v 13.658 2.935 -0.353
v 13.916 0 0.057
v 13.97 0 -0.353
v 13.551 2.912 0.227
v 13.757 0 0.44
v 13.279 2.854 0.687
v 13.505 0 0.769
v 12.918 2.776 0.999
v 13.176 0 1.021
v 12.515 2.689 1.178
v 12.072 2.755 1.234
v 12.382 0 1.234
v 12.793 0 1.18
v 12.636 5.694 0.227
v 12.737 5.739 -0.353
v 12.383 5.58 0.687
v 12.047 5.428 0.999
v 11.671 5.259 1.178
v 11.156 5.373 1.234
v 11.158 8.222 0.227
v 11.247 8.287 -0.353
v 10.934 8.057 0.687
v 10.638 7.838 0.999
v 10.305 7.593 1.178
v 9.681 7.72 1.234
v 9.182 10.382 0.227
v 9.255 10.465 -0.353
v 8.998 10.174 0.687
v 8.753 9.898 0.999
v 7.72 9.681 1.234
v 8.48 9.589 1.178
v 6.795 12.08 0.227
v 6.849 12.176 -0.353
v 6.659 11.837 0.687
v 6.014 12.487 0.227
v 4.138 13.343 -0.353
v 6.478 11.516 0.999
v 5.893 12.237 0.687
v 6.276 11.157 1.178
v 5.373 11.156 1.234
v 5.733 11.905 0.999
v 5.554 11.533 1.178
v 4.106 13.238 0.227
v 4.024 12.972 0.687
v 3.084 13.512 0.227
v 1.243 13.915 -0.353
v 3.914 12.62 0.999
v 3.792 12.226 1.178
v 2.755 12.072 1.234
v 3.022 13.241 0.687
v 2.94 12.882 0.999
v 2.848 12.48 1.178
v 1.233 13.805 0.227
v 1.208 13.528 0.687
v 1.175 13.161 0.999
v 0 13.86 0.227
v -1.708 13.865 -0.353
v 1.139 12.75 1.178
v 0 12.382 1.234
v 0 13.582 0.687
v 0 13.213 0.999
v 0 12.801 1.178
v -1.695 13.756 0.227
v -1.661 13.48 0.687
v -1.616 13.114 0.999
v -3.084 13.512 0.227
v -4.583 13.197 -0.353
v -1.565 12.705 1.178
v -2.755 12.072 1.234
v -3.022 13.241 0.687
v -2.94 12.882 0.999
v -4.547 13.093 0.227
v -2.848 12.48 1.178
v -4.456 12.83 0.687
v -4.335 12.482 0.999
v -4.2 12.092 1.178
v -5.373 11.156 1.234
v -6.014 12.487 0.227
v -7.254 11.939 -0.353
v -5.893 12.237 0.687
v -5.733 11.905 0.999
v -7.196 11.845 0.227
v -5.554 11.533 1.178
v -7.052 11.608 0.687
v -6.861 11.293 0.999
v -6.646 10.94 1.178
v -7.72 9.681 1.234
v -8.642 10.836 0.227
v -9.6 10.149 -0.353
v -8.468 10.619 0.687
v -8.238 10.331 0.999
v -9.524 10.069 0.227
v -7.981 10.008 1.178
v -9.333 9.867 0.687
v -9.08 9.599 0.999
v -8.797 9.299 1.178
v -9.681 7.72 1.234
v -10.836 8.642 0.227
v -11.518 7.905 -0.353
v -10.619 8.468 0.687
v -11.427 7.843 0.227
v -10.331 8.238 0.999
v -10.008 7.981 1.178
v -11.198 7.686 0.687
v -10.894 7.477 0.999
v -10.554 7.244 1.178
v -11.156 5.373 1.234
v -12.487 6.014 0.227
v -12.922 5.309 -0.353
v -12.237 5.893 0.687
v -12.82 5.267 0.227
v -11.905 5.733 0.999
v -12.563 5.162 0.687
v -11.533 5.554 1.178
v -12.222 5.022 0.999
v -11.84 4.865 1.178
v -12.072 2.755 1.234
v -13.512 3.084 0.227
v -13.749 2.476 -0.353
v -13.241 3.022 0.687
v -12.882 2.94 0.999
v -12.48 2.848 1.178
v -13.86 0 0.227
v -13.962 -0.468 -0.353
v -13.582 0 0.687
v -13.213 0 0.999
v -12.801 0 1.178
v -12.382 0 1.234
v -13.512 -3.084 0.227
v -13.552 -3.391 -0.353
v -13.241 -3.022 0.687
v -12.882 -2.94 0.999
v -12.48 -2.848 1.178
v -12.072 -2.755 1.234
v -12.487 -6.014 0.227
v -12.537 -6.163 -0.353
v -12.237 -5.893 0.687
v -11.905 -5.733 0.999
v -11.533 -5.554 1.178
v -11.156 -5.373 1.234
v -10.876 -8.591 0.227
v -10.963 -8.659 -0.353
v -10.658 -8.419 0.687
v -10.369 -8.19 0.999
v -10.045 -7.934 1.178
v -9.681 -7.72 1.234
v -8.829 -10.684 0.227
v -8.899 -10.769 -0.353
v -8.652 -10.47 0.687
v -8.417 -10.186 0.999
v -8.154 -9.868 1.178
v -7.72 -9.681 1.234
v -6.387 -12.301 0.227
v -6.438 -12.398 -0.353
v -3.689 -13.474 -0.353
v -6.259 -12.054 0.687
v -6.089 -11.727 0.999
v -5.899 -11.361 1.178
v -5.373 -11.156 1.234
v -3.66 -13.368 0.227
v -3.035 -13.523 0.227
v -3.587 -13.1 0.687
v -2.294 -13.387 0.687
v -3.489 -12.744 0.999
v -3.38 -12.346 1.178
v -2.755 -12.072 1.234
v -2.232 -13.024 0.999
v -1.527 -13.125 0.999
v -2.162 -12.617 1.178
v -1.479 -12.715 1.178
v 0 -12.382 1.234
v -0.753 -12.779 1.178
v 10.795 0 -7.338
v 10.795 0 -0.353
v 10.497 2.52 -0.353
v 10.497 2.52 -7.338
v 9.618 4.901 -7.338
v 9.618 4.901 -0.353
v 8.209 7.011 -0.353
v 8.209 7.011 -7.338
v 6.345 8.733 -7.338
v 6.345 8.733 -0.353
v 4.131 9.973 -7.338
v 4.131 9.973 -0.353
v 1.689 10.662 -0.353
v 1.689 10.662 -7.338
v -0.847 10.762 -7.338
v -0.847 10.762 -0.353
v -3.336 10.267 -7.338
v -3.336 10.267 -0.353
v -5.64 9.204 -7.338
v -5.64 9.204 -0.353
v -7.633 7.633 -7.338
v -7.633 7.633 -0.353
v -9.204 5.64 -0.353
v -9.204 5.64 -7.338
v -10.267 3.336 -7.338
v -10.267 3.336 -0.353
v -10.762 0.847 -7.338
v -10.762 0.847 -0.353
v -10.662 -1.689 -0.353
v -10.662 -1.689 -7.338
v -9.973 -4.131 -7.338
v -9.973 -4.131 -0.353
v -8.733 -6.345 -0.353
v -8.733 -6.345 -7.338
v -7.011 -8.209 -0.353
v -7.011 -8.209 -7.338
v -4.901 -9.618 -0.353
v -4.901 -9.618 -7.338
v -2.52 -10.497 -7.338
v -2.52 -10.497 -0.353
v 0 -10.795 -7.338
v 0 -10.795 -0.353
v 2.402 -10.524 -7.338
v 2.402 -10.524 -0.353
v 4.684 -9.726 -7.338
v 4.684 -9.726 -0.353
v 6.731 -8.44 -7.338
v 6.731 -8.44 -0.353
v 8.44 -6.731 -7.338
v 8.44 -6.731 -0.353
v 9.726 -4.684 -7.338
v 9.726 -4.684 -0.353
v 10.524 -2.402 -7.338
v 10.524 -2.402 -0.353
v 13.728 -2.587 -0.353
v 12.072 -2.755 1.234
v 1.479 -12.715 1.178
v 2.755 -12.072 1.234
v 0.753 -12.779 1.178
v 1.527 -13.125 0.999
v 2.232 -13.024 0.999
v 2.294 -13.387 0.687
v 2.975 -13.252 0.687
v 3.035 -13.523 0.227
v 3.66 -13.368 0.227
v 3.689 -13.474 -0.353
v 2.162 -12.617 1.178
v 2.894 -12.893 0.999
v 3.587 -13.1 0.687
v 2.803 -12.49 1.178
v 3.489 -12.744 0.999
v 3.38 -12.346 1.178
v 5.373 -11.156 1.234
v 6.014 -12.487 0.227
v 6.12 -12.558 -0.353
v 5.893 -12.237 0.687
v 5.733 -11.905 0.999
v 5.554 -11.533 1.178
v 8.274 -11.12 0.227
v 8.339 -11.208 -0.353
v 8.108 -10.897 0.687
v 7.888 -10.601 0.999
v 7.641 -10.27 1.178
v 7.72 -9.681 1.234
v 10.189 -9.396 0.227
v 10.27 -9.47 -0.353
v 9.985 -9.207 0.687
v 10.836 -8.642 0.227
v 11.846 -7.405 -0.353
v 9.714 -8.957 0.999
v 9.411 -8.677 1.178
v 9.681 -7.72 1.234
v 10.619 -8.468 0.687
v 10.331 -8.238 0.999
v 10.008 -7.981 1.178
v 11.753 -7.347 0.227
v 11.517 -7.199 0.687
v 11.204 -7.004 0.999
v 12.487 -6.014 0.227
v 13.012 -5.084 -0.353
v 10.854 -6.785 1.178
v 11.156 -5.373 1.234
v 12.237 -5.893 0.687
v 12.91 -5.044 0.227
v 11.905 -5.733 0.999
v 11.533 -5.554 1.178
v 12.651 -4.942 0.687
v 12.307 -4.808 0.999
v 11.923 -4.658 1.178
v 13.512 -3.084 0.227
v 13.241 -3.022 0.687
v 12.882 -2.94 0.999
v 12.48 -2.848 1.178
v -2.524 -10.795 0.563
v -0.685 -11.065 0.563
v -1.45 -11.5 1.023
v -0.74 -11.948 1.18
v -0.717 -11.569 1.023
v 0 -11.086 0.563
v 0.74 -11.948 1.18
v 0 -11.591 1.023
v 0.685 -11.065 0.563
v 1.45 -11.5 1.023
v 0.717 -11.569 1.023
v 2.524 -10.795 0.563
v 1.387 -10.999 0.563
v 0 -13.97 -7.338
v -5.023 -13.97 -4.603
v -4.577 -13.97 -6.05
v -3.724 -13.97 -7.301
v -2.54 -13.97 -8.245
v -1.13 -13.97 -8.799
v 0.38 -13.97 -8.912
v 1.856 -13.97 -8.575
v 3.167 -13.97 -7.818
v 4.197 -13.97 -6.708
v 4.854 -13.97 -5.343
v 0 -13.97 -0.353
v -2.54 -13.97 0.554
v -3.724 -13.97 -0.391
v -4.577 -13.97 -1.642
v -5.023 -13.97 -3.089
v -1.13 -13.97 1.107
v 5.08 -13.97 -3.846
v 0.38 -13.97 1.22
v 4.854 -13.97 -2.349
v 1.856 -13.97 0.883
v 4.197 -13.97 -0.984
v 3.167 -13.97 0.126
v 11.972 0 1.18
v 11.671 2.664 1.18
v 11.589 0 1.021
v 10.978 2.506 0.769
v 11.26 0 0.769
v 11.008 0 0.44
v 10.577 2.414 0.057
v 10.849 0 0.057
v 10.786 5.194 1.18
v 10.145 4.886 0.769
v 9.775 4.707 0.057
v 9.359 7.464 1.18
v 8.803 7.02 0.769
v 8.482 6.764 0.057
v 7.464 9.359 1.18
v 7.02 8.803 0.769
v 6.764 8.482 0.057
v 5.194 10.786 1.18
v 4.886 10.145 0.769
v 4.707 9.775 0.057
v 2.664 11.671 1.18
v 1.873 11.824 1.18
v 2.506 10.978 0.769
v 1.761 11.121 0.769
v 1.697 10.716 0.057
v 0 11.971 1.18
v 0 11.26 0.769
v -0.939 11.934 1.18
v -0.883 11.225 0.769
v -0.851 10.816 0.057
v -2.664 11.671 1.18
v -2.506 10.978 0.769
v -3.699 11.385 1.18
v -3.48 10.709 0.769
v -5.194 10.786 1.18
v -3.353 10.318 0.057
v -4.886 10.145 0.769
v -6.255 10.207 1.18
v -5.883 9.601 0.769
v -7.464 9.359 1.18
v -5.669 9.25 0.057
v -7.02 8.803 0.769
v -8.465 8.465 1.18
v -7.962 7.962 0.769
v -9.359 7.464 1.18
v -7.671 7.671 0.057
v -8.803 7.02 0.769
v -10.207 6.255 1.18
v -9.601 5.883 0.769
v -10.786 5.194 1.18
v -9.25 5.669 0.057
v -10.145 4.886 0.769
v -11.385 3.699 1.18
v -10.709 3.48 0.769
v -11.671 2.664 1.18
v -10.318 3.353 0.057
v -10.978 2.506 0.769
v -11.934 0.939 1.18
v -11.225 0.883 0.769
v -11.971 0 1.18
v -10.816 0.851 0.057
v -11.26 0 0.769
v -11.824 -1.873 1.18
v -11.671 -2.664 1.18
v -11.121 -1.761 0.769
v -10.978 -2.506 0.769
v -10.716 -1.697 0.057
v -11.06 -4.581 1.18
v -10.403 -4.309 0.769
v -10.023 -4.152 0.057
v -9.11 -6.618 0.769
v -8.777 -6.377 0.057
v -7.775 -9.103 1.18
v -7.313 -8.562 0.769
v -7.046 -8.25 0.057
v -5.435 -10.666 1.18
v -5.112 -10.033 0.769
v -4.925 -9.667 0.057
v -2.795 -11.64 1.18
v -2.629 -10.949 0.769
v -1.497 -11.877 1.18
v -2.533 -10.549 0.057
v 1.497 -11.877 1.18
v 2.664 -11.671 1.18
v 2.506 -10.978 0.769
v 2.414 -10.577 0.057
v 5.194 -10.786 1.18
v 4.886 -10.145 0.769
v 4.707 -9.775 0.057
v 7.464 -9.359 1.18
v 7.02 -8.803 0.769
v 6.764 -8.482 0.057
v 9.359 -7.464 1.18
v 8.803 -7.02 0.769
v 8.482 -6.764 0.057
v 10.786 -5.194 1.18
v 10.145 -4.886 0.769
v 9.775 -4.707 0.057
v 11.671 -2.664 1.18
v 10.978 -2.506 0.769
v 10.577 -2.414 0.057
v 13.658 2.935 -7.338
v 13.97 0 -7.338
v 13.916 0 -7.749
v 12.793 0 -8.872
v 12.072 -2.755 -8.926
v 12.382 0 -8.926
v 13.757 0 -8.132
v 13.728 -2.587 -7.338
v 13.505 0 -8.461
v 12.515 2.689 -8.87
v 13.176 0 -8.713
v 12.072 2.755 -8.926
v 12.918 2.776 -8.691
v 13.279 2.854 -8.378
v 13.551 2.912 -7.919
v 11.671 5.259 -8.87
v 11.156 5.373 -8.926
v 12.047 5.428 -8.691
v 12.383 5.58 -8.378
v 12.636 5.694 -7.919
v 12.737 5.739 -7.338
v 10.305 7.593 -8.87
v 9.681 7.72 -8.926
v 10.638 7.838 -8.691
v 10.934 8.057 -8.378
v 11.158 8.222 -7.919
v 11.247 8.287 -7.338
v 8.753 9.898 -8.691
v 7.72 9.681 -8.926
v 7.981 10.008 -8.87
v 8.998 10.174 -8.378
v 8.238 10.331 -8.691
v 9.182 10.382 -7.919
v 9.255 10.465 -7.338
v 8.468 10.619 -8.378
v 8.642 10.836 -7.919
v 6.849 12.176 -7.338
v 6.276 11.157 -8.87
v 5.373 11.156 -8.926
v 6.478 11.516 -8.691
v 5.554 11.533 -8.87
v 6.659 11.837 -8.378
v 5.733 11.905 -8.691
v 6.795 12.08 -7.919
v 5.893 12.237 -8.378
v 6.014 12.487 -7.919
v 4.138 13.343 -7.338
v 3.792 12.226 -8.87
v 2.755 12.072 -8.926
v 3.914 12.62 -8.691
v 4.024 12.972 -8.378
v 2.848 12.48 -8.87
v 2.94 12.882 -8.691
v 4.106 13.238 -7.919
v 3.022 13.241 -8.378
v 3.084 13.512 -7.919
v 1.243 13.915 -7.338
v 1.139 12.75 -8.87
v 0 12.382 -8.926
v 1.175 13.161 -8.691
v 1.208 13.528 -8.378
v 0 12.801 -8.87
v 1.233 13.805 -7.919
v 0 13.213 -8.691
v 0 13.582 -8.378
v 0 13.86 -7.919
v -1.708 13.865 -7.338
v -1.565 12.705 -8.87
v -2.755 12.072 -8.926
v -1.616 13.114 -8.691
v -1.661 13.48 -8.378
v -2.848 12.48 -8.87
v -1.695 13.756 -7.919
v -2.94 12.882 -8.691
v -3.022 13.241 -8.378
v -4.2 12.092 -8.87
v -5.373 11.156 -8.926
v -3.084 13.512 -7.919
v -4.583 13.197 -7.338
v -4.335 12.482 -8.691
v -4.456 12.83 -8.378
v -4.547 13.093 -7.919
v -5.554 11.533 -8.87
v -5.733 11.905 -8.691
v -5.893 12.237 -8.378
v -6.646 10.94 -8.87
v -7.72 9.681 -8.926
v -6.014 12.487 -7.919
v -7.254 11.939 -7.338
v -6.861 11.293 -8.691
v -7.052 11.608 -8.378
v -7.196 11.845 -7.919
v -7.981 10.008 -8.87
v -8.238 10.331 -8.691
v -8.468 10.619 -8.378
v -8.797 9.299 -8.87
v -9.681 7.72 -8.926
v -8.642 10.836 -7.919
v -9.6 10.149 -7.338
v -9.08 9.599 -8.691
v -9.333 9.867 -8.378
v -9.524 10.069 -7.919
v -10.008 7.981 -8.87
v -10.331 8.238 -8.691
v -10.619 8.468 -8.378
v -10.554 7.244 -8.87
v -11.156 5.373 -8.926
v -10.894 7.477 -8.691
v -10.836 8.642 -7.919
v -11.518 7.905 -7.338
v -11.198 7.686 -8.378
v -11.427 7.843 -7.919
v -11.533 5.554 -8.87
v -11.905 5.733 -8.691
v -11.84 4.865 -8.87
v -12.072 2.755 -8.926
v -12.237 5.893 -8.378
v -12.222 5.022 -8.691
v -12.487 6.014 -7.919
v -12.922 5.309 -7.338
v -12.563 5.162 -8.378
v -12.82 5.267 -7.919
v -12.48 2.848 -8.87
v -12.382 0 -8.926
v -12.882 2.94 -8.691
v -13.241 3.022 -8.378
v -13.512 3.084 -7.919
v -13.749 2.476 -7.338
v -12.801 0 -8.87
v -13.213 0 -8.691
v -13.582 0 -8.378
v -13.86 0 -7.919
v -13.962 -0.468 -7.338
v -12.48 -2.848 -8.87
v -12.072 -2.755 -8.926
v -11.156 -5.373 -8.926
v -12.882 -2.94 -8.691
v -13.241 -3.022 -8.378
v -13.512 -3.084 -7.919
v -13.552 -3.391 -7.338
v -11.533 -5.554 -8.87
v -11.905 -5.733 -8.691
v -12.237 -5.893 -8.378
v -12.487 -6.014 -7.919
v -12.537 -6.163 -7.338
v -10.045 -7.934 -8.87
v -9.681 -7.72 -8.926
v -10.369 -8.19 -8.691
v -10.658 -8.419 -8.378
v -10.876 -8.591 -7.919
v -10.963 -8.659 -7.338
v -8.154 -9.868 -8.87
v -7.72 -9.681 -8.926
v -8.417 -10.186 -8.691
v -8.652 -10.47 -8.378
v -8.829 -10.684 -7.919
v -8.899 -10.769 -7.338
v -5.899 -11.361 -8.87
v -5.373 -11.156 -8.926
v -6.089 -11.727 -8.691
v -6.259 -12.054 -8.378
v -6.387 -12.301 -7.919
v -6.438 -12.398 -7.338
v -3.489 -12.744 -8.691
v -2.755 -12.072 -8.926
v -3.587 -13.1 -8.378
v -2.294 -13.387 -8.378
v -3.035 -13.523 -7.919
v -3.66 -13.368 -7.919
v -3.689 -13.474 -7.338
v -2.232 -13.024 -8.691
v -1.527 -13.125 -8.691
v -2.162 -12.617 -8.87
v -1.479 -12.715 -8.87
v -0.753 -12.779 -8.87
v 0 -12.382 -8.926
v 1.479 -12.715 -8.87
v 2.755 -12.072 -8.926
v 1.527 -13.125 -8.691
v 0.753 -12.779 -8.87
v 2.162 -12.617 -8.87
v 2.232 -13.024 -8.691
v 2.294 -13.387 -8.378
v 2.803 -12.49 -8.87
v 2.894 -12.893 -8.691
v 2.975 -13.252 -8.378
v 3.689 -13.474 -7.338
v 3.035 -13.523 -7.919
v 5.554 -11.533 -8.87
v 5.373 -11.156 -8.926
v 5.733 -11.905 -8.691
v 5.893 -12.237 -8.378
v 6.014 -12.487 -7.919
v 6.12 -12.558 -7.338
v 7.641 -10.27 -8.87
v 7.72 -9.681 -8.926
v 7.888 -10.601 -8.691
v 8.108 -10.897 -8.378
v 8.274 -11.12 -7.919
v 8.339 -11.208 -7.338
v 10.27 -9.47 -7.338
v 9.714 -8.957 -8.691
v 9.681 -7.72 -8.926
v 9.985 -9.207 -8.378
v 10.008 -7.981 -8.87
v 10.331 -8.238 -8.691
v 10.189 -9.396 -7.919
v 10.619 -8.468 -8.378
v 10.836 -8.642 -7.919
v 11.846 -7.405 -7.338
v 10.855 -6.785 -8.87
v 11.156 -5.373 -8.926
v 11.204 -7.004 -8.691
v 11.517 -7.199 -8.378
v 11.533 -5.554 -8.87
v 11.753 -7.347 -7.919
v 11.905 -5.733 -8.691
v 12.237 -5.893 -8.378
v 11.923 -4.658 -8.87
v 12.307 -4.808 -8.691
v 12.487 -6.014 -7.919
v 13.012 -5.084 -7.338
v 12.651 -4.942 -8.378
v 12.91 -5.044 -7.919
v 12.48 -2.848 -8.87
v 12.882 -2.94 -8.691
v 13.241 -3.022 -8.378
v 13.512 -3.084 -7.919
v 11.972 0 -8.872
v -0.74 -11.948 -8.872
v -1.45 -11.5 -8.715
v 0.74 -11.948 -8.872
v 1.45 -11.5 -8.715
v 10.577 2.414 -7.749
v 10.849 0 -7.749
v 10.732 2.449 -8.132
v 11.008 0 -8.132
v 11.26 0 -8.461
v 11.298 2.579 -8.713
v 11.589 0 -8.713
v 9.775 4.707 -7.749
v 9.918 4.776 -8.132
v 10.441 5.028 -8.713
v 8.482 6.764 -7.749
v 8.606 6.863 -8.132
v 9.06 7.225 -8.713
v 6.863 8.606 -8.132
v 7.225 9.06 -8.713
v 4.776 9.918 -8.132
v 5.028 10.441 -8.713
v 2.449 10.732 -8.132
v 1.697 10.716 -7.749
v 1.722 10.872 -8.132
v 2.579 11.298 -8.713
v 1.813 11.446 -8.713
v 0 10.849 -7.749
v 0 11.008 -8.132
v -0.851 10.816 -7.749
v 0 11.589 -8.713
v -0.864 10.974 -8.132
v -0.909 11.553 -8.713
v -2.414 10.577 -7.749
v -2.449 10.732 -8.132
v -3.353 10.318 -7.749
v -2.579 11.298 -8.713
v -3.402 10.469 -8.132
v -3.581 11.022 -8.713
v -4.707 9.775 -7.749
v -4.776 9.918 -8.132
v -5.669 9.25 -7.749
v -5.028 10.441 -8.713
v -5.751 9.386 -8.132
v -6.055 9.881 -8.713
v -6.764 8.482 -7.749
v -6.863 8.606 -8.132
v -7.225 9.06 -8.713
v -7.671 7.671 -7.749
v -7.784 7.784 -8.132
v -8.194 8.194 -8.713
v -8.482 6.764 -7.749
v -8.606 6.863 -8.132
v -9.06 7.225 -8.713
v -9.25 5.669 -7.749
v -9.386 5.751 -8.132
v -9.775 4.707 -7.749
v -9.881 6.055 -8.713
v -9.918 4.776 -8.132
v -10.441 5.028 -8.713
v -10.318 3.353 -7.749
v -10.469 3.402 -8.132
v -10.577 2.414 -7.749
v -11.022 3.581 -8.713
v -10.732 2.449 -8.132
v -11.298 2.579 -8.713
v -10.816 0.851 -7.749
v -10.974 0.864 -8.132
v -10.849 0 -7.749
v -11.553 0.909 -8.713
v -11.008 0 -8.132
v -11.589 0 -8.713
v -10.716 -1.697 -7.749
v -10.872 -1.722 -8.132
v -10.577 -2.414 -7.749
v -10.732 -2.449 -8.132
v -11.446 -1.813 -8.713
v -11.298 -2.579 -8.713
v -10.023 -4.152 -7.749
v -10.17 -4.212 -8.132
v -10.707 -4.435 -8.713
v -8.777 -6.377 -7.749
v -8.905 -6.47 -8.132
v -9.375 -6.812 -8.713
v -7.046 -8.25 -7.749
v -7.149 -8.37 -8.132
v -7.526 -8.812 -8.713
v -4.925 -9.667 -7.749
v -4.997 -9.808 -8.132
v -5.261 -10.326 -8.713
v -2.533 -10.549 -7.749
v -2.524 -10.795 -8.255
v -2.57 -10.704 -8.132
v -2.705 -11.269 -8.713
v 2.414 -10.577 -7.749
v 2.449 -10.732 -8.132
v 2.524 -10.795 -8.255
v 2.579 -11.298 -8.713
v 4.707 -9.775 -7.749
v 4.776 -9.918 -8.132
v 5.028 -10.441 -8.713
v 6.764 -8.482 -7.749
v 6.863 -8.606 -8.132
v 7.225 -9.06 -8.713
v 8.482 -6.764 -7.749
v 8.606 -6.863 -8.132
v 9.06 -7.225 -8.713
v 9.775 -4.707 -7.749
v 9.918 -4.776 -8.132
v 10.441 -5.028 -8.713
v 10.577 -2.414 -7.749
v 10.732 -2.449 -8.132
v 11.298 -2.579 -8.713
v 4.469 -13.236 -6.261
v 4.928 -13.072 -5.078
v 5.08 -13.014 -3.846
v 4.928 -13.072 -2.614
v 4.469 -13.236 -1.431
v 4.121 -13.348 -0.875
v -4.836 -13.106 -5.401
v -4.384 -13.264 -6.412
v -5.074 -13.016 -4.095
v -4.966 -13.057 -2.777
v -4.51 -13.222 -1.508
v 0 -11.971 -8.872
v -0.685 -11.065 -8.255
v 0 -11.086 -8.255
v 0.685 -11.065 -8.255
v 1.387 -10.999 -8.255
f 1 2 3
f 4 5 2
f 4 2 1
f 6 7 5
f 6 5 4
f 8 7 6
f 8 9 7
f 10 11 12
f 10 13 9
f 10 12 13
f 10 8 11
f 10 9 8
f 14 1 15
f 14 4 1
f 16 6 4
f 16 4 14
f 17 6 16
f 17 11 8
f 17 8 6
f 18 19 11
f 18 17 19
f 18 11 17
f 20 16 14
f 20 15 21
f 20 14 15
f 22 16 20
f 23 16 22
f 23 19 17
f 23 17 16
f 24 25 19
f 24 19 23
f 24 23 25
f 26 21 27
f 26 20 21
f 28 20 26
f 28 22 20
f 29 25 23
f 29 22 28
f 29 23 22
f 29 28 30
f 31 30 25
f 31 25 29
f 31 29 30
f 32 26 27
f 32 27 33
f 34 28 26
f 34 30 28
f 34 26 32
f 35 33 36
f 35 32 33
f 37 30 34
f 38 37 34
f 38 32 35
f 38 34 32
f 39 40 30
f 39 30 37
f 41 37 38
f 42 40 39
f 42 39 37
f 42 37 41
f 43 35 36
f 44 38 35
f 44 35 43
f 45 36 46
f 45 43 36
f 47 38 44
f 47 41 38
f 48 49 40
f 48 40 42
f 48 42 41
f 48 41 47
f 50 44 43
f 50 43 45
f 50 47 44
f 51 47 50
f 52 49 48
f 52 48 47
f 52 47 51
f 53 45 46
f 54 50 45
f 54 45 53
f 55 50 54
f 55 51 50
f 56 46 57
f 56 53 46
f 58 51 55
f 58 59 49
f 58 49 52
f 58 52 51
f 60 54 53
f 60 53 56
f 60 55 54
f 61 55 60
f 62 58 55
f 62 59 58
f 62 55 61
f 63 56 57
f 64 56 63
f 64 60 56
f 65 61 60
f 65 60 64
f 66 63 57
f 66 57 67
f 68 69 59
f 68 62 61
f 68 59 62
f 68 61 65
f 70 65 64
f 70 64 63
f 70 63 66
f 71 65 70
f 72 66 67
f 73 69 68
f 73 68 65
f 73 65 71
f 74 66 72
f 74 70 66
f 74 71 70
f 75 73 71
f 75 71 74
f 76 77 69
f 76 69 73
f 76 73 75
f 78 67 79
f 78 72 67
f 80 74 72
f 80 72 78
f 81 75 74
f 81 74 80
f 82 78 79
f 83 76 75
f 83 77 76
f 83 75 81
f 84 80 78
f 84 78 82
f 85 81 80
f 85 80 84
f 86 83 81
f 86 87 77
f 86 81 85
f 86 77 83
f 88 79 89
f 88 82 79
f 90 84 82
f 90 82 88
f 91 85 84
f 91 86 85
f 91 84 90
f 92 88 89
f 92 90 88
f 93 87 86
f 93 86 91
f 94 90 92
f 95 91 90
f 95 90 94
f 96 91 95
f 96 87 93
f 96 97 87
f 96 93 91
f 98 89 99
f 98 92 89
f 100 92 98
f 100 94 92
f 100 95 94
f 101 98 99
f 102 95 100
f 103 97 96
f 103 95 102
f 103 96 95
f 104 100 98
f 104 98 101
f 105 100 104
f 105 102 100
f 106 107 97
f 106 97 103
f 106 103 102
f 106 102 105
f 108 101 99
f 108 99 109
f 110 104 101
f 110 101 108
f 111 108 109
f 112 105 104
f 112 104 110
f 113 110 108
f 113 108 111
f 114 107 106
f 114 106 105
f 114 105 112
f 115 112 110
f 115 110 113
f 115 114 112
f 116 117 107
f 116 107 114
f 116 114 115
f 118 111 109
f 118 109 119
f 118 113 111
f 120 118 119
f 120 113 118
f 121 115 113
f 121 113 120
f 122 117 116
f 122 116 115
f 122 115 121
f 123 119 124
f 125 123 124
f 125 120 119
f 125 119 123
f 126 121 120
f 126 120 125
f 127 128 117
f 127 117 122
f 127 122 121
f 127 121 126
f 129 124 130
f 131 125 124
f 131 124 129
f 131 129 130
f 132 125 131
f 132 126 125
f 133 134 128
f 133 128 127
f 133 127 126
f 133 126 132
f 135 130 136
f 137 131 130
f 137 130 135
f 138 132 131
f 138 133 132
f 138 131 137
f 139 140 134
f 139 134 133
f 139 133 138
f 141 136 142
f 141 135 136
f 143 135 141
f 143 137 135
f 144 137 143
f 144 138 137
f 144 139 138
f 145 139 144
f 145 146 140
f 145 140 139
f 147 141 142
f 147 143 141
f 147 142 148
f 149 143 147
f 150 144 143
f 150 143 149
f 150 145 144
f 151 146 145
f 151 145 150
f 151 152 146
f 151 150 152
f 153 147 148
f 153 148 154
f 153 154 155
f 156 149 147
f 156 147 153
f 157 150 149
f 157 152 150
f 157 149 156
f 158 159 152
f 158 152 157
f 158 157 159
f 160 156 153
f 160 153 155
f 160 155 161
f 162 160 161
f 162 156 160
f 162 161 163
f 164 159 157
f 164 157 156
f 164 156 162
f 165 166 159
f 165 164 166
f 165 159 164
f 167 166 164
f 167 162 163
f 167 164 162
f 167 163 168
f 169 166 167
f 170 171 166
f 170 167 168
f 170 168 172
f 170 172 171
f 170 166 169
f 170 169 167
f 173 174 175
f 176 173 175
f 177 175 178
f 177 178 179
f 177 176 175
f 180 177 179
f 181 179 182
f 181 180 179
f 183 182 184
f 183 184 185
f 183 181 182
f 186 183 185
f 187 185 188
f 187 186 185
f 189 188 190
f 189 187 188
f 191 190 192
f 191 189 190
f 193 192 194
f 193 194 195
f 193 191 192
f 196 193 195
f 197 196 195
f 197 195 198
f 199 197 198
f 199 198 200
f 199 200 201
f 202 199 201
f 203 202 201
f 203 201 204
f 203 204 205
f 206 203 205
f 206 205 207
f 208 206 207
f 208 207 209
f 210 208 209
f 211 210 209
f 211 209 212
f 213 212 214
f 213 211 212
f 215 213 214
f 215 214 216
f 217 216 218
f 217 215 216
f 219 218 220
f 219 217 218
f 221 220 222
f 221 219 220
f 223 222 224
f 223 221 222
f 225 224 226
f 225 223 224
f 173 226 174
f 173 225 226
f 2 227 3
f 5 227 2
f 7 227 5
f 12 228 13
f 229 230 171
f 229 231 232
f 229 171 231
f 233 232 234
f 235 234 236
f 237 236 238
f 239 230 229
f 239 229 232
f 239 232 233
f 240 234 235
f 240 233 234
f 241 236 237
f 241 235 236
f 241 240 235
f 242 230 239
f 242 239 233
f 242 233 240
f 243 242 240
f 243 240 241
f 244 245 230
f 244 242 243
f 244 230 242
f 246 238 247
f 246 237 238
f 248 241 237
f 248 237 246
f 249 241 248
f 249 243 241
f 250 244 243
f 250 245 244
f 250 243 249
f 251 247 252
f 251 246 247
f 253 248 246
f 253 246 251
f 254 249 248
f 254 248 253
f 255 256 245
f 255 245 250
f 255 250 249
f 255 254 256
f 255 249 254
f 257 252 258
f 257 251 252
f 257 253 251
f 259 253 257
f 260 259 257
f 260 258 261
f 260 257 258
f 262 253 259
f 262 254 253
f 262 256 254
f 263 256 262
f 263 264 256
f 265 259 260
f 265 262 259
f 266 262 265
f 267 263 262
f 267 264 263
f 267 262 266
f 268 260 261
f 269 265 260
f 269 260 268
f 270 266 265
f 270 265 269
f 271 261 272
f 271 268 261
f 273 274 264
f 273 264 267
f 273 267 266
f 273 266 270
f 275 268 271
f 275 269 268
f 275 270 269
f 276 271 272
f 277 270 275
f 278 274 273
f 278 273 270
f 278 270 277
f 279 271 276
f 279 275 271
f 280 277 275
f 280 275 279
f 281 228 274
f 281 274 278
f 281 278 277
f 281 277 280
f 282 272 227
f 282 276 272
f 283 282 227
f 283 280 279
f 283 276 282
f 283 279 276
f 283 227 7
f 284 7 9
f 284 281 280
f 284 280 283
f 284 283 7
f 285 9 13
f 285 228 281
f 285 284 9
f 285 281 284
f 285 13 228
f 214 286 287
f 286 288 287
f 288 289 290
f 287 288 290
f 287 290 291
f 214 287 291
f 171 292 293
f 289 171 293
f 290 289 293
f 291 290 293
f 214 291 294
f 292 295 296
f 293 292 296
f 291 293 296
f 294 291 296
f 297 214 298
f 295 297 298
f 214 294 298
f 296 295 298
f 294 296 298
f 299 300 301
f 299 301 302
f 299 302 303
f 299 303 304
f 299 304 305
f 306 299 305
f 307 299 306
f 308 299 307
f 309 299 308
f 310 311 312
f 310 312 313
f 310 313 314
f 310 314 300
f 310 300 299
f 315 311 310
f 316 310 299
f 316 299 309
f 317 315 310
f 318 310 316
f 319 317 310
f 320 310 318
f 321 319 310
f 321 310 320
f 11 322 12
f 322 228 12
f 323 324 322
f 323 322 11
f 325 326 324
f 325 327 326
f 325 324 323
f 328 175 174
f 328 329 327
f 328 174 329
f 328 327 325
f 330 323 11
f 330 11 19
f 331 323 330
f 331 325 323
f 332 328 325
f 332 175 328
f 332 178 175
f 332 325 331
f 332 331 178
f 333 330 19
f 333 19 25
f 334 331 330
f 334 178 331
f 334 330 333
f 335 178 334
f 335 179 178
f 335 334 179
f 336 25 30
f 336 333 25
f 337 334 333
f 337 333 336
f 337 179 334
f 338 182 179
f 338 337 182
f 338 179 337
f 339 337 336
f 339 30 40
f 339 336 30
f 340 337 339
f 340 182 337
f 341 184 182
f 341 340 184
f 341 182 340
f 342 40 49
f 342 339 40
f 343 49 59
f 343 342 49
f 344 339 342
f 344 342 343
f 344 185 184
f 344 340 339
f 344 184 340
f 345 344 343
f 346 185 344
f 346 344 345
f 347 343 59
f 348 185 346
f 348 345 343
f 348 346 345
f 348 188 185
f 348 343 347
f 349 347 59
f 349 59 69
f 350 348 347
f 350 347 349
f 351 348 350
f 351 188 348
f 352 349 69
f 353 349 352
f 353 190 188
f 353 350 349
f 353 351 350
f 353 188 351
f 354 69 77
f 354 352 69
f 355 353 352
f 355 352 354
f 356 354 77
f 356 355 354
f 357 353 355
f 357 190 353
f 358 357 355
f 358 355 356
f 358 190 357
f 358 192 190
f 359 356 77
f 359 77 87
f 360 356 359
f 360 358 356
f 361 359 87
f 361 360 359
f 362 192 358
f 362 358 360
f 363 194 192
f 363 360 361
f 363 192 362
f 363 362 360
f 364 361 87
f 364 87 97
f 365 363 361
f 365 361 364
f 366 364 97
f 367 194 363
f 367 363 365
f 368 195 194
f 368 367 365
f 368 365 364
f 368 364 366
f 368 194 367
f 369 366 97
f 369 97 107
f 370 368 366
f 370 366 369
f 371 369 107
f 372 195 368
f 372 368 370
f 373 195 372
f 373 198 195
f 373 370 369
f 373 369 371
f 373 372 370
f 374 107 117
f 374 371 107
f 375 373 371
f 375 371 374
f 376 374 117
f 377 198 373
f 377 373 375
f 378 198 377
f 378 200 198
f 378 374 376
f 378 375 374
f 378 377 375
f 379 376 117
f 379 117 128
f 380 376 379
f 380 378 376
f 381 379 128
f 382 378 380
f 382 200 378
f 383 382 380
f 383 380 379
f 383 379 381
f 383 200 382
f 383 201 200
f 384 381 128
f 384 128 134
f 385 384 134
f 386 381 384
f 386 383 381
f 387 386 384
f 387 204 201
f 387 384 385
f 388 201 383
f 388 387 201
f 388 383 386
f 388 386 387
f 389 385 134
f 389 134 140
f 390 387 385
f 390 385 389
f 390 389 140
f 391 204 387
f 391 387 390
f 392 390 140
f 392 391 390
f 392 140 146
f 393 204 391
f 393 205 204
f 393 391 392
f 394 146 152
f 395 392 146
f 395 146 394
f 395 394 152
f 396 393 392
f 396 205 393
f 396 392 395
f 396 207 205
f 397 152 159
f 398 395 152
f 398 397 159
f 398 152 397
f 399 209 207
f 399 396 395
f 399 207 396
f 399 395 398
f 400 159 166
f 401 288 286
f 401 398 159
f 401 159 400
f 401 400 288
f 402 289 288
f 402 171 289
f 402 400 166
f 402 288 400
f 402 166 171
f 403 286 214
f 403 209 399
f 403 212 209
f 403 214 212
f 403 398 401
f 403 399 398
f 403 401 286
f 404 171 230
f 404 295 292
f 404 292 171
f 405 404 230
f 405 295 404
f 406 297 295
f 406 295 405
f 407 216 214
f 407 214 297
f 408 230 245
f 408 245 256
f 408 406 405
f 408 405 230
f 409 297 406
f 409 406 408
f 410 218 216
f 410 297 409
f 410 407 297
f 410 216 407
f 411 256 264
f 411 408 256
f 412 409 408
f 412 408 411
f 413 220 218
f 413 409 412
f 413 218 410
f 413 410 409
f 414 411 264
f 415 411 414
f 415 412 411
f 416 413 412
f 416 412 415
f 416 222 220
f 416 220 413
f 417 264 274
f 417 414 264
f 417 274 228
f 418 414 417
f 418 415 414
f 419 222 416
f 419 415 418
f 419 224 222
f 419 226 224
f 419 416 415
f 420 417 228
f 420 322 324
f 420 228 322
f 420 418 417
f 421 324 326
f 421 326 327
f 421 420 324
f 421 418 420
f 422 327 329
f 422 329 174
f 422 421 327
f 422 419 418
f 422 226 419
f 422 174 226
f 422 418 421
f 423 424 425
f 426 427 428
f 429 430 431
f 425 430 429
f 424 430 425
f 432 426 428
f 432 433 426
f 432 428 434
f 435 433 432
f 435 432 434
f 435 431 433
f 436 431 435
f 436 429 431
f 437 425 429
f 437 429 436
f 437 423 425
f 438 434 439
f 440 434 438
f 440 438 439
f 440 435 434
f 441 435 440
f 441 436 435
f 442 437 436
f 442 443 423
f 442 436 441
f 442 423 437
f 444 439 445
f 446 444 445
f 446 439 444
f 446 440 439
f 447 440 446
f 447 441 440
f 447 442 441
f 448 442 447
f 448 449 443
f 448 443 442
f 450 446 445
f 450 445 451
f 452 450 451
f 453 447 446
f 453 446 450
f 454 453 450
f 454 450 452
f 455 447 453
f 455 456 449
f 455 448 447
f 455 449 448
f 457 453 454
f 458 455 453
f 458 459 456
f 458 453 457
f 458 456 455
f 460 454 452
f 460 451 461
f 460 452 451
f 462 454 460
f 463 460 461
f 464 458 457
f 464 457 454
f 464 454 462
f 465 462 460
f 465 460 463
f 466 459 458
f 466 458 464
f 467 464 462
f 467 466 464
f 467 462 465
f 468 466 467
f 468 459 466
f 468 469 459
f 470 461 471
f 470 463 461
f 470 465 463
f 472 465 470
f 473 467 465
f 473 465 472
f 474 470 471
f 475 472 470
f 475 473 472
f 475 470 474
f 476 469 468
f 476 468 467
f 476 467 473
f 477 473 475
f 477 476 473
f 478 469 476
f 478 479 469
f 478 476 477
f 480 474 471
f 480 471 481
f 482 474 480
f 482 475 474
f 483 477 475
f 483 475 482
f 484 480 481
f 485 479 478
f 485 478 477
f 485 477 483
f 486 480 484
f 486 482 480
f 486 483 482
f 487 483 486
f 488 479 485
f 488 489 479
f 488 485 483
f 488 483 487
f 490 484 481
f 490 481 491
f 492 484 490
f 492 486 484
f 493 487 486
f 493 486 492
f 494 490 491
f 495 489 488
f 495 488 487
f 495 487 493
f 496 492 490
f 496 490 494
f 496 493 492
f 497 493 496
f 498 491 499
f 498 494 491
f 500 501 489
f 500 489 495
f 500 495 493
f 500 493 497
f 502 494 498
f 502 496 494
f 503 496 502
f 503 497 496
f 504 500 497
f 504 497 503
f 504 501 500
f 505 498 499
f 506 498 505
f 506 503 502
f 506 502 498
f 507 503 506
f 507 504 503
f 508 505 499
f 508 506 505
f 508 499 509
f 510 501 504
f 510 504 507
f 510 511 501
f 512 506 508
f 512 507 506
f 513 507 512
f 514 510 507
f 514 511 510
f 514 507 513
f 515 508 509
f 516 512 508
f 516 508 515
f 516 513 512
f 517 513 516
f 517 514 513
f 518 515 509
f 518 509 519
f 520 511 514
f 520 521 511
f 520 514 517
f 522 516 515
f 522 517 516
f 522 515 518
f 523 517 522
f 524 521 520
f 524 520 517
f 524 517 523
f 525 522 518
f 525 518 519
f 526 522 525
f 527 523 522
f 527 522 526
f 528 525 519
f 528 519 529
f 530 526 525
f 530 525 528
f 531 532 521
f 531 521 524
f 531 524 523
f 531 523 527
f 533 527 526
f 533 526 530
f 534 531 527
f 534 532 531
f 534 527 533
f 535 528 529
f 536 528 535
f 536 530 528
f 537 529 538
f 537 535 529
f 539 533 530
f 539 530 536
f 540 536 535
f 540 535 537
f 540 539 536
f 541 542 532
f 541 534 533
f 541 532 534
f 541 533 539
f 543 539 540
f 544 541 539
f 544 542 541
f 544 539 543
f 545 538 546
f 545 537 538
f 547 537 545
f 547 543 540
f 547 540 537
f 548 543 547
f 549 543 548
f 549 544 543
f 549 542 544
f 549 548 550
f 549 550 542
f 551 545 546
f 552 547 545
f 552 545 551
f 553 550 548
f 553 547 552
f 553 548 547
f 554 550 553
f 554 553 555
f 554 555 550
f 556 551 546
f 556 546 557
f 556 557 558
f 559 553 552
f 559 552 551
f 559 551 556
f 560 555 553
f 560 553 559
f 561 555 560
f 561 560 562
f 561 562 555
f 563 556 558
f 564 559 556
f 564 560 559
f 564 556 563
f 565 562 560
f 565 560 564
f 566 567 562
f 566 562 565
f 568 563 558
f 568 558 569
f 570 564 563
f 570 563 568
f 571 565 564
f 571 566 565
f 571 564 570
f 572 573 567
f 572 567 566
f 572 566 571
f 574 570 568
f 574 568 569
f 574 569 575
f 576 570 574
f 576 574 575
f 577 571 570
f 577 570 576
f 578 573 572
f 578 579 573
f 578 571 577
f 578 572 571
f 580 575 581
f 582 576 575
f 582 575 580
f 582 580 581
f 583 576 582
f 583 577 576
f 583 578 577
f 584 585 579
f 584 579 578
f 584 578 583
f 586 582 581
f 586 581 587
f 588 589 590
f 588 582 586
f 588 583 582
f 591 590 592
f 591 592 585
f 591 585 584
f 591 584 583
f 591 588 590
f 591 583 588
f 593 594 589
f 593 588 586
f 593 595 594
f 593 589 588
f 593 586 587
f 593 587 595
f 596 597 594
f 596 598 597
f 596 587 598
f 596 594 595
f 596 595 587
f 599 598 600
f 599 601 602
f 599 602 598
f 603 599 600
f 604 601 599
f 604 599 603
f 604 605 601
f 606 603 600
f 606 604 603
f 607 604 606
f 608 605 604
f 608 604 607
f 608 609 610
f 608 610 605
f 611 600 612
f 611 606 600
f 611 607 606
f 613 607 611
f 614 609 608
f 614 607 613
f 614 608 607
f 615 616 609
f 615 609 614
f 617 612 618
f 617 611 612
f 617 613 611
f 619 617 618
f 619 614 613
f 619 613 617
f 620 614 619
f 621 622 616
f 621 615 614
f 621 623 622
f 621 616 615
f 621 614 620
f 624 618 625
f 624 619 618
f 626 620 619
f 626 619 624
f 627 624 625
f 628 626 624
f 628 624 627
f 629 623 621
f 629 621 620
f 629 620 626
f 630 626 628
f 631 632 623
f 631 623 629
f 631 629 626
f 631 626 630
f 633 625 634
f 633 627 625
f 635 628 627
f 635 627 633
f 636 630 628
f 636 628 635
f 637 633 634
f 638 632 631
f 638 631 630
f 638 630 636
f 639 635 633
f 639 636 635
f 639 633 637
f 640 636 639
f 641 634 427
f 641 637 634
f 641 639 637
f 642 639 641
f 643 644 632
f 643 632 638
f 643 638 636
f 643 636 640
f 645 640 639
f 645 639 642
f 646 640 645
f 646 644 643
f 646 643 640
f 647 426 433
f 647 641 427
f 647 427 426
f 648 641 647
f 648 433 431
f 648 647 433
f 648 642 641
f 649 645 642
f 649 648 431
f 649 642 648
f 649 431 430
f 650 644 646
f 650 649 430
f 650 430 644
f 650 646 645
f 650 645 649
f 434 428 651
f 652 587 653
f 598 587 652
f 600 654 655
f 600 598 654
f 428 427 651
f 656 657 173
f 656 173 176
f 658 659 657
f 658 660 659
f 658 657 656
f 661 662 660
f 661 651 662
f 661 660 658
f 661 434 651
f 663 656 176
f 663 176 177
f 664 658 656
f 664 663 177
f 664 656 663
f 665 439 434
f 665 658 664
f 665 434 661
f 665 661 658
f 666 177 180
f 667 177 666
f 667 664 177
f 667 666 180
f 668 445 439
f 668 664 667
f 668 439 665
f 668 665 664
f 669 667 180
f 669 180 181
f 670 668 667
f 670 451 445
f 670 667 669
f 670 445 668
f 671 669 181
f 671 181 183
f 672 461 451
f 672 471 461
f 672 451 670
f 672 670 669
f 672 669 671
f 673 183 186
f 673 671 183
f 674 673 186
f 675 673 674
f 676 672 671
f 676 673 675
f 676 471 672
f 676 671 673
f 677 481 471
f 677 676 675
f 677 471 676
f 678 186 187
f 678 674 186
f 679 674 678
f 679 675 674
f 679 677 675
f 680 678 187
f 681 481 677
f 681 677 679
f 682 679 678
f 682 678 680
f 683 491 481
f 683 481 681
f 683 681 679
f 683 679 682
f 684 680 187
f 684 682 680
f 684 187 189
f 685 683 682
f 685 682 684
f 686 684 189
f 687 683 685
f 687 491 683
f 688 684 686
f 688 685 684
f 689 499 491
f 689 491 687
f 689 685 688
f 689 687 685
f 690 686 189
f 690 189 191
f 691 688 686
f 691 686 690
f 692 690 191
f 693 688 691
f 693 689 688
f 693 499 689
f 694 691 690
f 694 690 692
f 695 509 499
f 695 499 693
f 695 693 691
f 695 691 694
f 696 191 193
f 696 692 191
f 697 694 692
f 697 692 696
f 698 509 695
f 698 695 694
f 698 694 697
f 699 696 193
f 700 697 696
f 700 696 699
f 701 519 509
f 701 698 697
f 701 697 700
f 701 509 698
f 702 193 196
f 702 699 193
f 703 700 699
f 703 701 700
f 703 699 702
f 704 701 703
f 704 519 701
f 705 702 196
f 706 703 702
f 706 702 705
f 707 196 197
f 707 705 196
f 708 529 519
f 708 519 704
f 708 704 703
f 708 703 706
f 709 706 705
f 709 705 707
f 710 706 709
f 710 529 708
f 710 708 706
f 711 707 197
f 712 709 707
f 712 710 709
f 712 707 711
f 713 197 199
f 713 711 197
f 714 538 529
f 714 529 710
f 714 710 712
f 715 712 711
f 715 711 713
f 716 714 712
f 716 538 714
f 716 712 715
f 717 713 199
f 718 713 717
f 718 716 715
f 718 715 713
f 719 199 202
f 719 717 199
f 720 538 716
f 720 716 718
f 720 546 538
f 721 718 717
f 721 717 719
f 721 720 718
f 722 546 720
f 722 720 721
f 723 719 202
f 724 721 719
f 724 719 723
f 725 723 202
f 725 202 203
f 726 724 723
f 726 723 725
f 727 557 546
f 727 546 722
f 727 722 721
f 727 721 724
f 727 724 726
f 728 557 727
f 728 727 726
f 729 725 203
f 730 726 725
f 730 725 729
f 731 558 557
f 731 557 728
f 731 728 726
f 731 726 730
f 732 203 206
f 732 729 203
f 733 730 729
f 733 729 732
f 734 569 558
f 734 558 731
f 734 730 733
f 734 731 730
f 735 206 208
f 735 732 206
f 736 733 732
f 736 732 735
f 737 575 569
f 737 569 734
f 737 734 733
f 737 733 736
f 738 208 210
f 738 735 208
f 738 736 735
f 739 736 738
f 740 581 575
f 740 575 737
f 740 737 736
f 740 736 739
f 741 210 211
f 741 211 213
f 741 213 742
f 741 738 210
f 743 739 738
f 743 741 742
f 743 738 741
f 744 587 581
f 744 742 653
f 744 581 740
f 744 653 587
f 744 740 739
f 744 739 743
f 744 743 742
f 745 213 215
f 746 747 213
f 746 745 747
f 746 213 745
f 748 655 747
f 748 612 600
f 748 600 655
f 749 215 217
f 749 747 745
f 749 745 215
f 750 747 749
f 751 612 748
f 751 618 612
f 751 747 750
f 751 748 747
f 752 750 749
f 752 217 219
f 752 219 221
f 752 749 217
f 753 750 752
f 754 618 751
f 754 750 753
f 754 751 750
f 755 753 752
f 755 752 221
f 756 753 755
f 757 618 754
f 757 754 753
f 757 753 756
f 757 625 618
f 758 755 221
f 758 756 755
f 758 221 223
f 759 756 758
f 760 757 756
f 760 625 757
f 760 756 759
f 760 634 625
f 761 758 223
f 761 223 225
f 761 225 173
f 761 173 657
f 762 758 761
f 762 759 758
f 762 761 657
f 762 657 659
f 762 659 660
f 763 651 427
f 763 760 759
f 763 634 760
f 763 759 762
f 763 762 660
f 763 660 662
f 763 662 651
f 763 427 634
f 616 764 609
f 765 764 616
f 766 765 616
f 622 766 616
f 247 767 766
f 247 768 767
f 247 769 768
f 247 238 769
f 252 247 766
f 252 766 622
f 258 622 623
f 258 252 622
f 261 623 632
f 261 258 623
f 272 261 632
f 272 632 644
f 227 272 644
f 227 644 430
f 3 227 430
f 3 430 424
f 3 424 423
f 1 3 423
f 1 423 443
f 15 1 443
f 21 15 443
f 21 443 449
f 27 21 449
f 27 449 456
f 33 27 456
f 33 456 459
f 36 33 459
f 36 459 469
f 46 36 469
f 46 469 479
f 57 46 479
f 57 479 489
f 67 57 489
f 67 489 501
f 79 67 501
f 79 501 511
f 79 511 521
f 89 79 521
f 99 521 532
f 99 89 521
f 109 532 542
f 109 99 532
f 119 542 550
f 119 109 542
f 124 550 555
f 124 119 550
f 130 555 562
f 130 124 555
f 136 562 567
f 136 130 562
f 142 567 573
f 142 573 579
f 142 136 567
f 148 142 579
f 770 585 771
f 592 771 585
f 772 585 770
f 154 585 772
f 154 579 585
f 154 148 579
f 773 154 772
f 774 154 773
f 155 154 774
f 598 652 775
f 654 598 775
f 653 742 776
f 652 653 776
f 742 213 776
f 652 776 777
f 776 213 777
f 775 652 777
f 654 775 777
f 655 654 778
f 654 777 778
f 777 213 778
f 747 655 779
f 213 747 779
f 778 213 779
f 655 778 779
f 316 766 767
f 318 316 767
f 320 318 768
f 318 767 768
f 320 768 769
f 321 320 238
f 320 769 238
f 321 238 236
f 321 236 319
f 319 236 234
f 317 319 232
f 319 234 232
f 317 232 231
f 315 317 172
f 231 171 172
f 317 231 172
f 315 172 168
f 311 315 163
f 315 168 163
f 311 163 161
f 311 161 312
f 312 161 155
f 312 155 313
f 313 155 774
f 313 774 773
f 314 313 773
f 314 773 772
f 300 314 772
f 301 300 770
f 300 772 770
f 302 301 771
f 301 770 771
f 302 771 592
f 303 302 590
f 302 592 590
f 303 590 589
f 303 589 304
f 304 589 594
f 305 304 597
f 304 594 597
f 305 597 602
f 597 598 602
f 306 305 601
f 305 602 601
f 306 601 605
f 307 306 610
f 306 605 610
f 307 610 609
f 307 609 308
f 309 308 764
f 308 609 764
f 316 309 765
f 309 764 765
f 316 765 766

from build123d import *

# Parameters (mm, degrees)
F3_R     = 5.08
F4_DEPTH = 3.175


with BuildPart() as f1:
    # F0 (on Front) → F1 (revolve)
    with BuildSketch(Plane.XZ):
        with BuildLine():
            ThreePointArc((12.3825, 1.23411), (11.259968, 0.769142), (10.795, -0.35339))
            Line((10.795, -0.35339), (10.795, -7.33839))
            ThreePointArc((10.795, -7.33839), (11.259968, -8.460922), (12.3825, -8.92589))
            ThreePointArc((12.3825, -8.92589), (13.505032, -8.460922), (13.97, -7.33839))
            Line((13.97, -7.33839), (13.97, -0.35339))
            ThreePointArc((13.97, -0.35339), (13.505032, 0.769142), (12.3825, 1.23411))
        make_face()
    revolve(axis=Axis((0, 0, 14.801255), (0, 0, 1)))

    # F3 (on offset) → F4 (join)
    with BuildSketch(Plane.XZ.offset(10.795)):
        with Locations((0, -3.84589)):
            Circle(F3_R)
    extrude(amount=F4_DEPTH)

    # F0 (on Front) → F5 (revolve, cut)
    with BuildSketch(Plane.XZ):
        with BuildLine():
            Line((10.795, -7.33839), (10.795, -0.35339))
            ThreePointArc((10.795, -0.35339), (11.259968, 0.769142), (12.3825, 1.23411))
            Line((12.3825, 1.23411), (7.964968, 1.23411))
            Line((7.964968, 1.23411), (7.964968, -8.92589))
            Line((7.964968, -8.92589), (12.3825, -8.92589))
            ThreePointArc((12.3825, -8.92589), (11.259968, -8.460922), (10.795, -7.33839))
        make_face()
    revolve(axis=Axis((0, 0, 14.801255), (0, 0, 1)), mode=Mode.SUBTRACT)


solid = f1.part
